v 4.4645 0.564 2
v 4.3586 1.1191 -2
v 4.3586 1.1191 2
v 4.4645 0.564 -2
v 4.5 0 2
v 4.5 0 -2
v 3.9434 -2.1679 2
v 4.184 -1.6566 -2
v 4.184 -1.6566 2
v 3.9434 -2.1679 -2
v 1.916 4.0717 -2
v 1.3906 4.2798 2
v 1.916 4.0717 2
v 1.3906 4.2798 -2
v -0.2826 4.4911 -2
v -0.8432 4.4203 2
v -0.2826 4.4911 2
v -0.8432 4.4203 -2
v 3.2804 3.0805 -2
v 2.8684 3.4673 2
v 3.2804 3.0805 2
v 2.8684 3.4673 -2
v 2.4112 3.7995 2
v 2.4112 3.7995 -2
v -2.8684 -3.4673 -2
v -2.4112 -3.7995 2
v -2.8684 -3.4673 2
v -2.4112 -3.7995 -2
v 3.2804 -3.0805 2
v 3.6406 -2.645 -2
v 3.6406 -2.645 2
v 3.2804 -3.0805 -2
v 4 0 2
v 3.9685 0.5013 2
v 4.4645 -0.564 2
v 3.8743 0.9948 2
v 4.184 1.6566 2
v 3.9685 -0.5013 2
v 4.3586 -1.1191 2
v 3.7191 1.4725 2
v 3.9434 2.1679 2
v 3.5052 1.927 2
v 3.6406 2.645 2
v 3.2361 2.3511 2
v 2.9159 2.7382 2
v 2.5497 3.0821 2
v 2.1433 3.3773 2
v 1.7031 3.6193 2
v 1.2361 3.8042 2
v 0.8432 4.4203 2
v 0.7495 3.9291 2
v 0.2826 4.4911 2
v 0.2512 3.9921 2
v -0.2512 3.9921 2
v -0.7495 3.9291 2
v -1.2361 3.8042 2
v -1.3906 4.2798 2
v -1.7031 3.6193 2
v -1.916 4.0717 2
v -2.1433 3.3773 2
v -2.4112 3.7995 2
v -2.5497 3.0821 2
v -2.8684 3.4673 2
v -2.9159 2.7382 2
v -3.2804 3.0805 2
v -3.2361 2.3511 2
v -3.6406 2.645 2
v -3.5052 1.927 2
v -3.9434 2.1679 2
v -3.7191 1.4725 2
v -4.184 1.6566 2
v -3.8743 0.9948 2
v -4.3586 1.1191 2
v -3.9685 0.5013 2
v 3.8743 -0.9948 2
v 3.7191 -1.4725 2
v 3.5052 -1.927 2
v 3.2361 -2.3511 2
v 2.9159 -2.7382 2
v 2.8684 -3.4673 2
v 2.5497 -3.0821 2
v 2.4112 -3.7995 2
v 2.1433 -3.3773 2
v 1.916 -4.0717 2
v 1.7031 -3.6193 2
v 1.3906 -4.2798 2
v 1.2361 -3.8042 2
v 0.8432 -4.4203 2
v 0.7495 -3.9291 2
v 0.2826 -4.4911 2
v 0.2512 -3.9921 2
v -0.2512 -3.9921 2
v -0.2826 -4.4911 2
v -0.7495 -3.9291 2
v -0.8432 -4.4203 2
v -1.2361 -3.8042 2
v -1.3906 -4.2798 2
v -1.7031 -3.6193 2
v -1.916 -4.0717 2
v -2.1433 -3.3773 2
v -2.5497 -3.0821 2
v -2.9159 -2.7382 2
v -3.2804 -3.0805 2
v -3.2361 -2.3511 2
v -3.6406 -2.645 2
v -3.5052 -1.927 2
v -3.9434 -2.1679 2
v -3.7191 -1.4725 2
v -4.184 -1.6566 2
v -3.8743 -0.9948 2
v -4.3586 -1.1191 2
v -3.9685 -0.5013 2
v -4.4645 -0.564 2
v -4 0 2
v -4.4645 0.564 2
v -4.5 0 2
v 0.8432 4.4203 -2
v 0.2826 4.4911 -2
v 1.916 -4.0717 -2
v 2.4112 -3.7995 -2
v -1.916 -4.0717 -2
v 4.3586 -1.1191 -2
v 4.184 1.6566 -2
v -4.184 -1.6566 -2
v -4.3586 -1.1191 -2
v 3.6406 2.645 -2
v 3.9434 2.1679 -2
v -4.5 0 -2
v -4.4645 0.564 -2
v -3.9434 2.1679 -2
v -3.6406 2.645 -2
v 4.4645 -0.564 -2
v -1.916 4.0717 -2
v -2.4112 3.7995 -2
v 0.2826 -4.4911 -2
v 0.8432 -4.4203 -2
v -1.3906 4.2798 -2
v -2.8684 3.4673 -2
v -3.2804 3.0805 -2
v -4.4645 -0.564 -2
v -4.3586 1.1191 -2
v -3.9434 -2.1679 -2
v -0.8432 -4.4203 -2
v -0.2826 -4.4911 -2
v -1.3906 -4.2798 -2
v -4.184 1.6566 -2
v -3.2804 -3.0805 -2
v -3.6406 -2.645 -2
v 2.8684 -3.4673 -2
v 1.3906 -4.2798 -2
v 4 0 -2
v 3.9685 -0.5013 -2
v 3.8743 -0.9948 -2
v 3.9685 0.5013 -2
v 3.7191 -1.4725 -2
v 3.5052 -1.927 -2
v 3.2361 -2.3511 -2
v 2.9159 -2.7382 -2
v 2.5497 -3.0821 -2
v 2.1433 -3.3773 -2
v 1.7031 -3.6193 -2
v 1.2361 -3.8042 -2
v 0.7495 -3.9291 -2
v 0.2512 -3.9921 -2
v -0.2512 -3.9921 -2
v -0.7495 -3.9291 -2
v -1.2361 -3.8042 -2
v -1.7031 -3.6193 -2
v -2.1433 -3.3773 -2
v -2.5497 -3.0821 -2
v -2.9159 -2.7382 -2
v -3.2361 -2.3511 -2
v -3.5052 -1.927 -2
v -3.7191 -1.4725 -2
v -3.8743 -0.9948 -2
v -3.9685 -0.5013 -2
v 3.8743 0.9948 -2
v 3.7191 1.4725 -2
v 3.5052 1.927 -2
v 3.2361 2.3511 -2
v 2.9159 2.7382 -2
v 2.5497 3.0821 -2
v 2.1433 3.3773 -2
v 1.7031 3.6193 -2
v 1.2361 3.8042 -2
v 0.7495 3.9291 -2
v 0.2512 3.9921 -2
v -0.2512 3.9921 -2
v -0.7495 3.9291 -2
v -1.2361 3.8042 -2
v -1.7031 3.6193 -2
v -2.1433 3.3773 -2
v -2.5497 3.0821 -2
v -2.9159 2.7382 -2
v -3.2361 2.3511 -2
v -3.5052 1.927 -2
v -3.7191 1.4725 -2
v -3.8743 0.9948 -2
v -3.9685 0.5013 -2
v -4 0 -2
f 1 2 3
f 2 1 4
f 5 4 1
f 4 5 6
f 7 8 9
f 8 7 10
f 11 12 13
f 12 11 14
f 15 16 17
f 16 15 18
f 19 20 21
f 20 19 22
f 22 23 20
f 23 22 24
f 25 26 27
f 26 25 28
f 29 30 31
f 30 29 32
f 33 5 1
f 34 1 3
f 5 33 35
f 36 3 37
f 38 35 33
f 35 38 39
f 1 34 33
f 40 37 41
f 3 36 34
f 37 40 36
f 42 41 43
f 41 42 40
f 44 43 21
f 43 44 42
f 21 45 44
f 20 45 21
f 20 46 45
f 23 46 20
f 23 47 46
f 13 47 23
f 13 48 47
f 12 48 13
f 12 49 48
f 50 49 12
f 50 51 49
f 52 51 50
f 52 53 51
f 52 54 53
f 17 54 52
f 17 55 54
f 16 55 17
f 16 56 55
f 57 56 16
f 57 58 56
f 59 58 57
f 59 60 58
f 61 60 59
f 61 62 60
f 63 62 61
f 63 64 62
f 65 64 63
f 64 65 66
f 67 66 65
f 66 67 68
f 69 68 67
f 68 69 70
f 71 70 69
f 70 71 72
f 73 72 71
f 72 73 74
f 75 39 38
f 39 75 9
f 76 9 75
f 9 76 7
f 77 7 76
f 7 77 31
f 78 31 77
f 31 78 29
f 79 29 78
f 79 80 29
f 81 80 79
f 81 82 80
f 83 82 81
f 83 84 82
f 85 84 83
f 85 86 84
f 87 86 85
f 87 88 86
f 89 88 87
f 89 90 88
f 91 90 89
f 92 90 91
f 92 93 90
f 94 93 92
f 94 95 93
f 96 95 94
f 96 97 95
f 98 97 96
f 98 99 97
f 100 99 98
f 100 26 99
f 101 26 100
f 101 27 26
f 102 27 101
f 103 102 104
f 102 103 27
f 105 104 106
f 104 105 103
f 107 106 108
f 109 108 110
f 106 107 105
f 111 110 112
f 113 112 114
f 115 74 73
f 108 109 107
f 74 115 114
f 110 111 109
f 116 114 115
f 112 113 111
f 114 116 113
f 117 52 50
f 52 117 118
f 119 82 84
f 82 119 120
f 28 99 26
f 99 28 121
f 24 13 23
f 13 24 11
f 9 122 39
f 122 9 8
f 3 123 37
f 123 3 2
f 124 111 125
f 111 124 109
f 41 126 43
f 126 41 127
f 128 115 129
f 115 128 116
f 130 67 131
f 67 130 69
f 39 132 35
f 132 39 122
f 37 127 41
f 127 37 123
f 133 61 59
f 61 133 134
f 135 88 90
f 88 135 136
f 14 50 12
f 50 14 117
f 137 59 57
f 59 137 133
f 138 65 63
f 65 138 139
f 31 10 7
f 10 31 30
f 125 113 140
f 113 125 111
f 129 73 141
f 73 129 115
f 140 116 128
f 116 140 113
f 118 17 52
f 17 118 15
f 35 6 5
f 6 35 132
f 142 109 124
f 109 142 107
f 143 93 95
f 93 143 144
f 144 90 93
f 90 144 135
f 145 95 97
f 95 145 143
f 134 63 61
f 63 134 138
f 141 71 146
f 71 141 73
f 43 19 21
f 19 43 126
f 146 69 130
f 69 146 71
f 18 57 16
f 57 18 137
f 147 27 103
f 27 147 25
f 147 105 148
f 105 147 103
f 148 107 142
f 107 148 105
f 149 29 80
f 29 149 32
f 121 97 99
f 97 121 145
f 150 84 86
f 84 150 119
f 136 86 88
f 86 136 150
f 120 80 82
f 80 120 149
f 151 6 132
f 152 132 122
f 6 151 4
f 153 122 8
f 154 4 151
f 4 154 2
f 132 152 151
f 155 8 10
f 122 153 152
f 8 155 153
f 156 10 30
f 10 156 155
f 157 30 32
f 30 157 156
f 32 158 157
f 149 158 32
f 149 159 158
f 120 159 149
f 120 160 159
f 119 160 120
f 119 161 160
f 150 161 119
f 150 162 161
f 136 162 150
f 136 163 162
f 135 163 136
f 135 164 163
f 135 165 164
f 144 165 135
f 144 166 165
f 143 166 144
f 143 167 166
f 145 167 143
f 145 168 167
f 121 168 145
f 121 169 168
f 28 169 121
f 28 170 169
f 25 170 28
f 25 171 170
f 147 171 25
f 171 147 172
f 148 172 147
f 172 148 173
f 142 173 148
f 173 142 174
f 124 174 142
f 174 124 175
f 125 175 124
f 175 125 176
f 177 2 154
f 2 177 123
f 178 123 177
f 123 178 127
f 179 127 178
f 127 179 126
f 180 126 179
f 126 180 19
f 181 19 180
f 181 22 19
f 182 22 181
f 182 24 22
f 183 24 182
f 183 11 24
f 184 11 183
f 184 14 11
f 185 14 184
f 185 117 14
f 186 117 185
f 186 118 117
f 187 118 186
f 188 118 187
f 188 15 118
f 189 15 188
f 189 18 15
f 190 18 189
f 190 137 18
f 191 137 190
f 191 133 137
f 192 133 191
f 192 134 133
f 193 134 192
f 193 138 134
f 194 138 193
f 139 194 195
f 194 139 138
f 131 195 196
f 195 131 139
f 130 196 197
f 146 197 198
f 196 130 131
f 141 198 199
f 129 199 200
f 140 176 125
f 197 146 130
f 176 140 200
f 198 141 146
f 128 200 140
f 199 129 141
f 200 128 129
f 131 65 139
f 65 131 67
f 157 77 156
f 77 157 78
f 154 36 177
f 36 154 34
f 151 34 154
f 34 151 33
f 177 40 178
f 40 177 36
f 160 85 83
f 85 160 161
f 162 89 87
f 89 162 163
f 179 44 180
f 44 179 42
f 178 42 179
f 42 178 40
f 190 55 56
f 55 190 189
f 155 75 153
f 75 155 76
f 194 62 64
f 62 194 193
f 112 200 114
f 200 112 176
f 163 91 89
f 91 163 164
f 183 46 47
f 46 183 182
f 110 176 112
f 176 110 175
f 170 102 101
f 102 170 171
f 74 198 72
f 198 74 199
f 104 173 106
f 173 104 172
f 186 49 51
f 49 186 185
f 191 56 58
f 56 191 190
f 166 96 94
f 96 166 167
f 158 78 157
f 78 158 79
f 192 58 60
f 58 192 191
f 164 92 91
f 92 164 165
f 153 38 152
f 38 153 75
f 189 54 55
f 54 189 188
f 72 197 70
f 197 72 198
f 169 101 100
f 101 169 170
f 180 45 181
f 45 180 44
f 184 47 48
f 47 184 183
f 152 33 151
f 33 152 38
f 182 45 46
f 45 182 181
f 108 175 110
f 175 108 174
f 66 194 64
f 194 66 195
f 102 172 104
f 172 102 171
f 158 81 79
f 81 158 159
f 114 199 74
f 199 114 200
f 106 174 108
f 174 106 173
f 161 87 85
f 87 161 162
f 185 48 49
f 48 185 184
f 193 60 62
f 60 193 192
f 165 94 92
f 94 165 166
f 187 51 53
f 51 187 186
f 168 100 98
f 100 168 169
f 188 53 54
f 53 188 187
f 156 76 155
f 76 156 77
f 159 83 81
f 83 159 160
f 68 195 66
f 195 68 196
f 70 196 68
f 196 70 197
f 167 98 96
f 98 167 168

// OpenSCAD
$fn = 50;


difference() {
	union() {
		translate(v = [0, 0, -2.0000000000]) {
			cylinder(h = 4, r = 4.5000000000);
		}
	}
	union() {
		translate(v = [0, 0, -100.0000000000]) {
			cylinder(h = 200, r = 4.0000000000);
		}
	}
}
